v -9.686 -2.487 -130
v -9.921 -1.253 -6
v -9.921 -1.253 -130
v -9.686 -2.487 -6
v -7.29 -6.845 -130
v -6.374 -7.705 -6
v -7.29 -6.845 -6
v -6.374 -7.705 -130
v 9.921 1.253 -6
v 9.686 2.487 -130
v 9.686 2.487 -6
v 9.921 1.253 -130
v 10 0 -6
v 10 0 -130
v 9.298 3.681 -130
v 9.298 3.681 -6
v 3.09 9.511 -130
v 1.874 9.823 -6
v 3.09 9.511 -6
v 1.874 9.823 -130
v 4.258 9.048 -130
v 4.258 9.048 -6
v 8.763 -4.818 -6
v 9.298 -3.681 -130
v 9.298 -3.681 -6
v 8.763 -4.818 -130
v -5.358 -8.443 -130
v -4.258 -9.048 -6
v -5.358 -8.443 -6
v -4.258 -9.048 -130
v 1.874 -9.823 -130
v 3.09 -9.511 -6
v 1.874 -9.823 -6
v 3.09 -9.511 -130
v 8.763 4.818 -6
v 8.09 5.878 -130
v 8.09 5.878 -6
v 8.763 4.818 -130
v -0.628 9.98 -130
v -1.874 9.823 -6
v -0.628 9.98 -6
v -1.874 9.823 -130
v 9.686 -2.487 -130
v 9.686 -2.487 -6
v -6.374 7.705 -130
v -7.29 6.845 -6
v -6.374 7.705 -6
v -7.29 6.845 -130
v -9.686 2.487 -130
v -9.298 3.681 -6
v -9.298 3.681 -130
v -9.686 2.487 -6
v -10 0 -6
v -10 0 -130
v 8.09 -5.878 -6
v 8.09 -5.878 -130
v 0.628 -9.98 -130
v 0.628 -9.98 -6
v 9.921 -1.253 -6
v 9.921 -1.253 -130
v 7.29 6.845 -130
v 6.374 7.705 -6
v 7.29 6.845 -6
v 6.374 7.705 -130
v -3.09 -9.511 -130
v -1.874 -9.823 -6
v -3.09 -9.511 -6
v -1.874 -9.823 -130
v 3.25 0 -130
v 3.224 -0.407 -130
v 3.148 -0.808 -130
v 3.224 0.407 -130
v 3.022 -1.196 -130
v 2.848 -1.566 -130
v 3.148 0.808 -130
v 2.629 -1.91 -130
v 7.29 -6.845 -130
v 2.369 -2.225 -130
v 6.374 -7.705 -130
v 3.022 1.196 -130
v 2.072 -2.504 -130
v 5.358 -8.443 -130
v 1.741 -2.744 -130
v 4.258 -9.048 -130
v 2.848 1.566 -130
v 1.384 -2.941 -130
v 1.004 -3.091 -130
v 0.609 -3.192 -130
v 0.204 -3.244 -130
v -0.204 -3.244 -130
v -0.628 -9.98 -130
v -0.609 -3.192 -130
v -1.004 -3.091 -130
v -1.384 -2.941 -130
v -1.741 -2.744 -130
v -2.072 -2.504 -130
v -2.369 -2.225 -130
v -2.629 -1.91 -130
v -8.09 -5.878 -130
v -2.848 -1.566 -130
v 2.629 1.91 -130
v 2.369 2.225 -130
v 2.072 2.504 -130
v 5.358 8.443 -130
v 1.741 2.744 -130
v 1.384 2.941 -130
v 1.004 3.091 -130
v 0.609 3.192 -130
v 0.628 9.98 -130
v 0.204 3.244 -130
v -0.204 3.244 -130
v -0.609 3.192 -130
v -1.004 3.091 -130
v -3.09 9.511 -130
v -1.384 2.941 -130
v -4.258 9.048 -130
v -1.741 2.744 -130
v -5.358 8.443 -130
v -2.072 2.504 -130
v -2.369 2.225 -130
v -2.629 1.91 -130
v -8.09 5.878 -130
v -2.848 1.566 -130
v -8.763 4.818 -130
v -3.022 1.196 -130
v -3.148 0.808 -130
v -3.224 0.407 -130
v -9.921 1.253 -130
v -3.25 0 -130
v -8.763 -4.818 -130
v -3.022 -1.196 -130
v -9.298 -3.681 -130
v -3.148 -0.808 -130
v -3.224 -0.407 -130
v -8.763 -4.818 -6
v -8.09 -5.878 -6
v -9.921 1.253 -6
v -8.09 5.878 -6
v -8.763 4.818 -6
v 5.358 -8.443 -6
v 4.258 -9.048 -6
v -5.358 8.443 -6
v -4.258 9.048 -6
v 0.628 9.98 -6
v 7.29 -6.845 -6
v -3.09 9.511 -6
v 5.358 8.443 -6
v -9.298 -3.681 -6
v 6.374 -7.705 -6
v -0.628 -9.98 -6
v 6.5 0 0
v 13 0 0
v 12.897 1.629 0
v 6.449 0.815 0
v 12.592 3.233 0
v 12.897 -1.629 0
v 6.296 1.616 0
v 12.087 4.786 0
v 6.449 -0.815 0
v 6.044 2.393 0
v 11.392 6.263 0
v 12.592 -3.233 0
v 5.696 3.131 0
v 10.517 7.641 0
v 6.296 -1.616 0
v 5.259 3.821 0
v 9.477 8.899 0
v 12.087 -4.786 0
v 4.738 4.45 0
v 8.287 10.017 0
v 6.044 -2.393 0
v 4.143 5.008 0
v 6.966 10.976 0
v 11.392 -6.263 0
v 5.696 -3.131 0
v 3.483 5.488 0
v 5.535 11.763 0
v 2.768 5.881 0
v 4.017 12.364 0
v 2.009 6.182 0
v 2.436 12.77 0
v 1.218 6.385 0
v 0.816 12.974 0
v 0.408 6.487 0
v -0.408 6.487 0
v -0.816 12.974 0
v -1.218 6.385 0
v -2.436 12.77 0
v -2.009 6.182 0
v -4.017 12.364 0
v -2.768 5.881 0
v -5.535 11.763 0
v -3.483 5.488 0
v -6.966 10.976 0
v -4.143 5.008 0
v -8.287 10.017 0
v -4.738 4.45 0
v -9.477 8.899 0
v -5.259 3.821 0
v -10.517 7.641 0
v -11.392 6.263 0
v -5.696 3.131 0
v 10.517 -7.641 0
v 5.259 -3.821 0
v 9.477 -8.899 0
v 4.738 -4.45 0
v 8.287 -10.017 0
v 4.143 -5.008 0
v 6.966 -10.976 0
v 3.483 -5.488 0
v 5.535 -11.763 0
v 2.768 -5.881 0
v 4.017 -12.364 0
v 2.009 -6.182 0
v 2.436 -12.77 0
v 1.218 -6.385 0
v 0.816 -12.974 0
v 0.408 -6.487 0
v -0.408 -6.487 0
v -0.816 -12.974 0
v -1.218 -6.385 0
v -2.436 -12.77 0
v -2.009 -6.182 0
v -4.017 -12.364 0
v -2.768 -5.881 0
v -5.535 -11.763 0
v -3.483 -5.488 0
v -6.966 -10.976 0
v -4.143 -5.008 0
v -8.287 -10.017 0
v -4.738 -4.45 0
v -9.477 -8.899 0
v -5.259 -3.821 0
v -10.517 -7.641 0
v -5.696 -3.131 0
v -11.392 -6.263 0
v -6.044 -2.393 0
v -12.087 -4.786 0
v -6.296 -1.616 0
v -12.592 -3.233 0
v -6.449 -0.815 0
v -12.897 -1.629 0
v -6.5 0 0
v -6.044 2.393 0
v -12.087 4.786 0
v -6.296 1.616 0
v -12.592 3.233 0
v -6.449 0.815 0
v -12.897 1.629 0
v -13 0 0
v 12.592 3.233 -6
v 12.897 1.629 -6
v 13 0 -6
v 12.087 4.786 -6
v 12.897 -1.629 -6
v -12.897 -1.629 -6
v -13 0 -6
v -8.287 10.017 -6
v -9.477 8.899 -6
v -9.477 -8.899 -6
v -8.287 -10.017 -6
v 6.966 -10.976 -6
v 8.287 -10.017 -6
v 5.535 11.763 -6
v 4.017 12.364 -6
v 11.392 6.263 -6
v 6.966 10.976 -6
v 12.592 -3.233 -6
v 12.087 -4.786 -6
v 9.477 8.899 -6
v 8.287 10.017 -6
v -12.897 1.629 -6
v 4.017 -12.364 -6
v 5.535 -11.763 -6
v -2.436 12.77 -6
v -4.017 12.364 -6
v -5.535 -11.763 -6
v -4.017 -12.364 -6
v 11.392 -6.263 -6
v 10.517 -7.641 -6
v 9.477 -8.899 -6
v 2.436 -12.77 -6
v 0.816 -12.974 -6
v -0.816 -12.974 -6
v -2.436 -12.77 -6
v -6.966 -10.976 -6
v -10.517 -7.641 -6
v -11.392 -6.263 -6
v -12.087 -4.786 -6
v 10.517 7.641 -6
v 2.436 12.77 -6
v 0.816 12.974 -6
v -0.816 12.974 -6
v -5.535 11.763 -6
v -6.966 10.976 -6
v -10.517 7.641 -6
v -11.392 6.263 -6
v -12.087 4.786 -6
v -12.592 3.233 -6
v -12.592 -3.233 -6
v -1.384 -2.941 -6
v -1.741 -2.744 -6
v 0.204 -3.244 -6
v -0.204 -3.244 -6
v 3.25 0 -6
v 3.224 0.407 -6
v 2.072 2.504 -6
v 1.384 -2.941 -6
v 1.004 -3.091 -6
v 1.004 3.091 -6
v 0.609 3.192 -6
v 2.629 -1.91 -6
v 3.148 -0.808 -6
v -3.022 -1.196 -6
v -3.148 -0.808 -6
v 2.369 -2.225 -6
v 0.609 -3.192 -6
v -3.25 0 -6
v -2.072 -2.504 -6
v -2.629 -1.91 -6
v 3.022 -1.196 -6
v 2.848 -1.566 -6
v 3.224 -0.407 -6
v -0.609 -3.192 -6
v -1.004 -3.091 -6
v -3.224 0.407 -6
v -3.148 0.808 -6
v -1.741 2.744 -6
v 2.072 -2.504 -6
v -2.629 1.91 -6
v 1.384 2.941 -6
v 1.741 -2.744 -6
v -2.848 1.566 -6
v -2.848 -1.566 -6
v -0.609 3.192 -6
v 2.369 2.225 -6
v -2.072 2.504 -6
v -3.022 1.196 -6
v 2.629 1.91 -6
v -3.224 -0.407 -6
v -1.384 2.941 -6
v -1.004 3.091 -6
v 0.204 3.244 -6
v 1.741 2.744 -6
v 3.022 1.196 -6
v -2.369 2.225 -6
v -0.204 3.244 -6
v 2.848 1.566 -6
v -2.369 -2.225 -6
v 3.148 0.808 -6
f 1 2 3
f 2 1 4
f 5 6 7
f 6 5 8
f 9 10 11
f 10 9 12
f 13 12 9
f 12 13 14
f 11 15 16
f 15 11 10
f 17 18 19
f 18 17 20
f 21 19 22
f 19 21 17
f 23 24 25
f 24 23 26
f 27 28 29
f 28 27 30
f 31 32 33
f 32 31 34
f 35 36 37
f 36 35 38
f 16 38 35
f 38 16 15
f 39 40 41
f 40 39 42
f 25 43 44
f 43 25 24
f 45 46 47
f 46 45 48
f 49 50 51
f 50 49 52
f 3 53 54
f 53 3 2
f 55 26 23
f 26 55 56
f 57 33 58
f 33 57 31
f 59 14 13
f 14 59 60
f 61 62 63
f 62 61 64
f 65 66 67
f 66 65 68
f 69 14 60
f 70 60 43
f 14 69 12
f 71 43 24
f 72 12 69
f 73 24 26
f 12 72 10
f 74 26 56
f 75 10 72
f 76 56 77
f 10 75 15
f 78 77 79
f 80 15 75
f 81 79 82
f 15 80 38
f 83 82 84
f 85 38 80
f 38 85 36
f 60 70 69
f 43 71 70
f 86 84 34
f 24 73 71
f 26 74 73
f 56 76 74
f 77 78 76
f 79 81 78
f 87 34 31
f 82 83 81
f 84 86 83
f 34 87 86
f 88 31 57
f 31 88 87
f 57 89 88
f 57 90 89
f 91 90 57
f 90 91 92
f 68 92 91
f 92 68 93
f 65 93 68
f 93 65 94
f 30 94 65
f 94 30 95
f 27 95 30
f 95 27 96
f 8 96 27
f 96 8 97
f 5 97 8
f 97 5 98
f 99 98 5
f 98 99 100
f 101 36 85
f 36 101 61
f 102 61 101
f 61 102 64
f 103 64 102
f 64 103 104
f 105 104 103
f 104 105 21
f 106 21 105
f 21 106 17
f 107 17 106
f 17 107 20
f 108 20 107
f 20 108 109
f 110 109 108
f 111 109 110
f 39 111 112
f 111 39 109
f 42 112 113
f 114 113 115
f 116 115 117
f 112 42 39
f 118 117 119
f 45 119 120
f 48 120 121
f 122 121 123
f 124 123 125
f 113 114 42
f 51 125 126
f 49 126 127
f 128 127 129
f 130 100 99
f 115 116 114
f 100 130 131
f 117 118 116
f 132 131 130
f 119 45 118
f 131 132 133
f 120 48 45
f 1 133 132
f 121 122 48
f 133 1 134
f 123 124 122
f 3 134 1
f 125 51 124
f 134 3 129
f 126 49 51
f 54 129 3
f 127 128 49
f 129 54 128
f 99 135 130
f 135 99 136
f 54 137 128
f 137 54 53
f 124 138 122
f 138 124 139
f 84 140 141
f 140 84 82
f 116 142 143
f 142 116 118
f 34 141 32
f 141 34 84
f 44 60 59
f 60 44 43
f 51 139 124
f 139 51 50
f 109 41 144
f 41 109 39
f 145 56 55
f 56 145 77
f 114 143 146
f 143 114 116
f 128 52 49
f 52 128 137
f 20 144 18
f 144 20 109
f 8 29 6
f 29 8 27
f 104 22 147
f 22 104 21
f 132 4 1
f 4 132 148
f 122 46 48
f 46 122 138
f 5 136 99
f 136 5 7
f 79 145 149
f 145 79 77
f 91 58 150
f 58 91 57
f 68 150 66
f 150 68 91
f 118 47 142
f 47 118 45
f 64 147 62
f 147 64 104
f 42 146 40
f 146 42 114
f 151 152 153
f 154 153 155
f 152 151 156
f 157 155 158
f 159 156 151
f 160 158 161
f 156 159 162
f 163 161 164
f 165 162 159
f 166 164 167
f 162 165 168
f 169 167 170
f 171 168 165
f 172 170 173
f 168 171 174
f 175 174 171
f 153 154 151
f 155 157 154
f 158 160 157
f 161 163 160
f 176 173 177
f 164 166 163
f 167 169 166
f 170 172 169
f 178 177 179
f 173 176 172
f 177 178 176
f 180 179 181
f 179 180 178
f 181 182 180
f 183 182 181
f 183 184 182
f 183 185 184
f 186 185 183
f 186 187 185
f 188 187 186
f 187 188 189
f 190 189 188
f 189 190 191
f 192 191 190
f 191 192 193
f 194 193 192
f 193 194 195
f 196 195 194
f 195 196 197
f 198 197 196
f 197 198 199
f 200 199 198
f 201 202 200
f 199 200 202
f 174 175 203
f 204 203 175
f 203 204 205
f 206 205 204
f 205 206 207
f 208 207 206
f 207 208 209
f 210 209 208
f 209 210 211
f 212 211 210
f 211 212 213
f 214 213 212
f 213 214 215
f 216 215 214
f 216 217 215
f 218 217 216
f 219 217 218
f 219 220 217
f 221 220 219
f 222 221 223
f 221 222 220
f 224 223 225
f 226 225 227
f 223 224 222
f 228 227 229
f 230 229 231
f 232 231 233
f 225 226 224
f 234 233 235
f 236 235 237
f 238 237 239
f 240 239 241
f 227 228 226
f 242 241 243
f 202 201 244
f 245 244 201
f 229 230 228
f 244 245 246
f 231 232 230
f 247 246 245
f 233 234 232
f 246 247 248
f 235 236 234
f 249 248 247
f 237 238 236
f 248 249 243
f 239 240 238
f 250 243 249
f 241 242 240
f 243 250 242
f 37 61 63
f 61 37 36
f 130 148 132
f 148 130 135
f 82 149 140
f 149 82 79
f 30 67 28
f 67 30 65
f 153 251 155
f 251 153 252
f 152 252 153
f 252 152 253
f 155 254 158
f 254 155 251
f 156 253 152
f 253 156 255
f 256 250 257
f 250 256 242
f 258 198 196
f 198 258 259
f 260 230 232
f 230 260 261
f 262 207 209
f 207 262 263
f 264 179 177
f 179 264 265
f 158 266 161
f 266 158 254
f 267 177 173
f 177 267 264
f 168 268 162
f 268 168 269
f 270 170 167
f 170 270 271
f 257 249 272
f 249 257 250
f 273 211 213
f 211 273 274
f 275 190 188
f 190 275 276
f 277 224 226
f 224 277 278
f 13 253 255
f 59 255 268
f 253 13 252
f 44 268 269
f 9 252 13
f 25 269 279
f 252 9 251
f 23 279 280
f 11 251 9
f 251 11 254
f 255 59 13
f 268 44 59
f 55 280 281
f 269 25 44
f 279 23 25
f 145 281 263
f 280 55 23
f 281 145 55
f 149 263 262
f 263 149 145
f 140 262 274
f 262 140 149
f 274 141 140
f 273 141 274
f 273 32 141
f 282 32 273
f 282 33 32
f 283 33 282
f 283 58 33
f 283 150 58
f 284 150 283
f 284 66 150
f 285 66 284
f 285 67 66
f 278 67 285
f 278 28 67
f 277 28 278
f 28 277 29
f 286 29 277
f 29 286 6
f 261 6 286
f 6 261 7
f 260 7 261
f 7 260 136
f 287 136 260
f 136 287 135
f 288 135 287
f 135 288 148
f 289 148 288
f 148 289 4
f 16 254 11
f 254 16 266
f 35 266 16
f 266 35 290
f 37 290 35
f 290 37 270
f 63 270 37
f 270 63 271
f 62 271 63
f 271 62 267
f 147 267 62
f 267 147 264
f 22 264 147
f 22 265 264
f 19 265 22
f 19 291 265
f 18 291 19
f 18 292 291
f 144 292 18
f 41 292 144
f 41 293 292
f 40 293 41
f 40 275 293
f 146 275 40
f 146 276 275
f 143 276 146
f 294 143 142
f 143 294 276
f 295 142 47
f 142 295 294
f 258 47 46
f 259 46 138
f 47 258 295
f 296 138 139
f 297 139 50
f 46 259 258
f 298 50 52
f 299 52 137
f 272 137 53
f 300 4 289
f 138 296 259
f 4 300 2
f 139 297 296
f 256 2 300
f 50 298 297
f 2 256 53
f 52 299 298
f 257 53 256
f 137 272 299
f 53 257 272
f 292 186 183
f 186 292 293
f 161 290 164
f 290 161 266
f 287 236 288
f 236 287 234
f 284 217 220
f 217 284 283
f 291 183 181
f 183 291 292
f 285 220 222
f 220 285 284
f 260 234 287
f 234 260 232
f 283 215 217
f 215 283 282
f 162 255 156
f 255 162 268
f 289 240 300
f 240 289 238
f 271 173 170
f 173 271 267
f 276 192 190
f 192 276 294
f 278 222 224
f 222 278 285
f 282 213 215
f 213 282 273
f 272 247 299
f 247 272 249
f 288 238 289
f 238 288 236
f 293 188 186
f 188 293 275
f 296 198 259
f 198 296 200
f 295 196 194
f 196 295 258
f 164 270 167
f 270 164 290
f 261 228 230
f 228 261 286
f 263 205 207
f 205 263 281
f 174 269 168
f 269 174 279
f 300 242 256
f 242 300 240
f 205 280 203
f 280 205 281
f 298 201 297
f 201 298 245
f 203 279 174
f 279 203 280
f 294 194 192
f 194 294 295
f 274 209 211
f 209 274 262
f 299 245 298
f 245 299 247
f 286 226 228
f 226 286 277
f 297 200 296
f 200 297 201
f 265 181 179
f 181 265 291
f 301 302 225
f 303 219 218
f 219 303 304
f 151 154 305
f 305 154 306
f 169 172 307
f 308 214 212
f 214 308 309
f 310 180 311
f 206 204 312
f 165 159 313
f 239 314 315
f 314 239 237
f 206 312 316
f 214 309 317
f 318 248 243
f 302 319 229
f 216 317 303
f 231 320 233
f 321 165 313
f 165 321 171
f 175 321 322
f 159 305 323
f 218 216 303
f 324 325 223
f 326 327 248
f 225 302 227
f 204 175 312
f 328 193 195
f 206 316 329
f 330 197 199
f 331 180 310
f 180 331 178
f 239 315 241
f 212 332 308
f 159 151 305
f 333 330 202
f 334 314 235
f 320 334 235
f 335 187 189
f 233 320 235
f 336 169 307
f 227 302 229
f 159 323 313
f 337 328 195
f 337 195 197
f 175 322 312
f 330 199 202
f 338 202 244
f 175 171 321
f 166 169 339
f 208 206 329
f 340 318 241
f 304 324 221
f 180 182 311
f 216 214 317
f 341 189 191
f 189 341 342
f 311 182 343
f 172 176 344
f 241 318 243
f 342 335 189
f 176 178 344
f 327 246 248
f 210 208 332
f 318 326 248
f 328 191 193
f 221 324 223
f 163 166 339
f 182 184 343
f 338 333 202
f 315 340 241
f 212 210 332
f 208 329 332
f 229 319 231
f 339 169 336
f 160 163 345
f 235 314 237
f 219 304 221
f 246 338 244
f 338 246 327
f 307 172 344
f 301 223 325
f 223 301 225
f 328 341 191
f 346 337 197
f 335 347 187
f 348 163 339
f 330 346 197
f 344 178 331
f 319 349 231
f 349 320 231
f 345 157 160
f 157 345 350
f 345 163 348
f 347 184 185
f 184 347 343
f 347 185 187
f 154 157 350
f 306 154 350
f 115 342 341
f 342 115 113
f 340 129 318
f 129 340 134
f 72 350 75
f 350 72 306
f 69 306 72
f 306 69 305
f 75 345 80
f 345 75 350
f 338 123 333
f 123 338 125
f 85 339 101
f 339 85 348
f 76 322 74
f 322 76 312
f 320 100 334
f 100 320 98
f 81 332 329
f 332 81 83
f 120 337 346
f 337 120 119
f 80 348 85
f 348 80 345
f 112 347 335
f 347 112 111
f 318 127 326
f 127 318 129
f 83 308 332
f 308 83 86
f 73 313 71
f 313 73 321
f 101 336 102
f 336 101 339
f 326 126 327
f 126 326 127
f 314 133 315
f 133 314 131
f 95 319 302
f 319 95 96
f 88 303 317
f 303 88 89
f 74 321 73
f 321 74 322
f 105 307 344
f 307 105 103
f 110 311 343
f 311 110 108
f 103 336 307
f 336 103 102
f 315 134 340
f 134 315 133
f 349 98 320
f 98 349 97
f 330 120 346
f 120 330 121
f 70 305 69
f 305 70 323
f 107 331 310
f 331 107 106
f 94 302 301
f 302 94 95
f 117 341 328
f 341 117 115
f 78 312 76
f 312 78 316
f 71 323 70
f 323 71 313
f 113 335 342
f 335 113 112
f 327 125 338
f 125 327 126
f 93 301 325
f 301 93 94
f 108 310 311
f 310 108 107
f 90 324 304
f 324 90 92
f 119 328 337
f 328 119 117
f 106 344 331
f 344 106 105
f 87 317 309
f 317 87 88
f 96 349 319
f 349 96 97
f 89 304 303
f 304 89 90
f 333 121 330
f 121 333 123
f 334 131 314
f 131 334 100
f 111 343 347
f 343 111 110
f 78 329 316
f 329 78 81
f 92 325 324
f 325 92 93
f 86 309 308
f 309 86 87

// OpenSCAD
$fn = 50;


difference() {
	union() {
		translate(v = [0, 0, -130.0000000000]) {
			cylinder(h = 130, r = 10.0000000000);
		}
		translate(v = [0, 0, -6.0000000000]) {
			cylinder(h = 6, r = 13.0000000000);
		}
	}
	union() {
		translate(v = [0, 0, 0]) {
			rotate(a = [0, 0, 0]) {
				difference() {
					union() {
						#translate(v = [0, 0, -130.0000000000]) {
							cylinder(h = 130, r = 2.2500000000);
						}
						#translate(v = [0, 0, -6]) {
							cylinder(h = 6, r1 = 3.2500000000, r2 = 6.5000000000);
						}
						#translate(v = [0, 0, -130.0000000000]) {
							cylinder(h = 130, r = 3.2500000000);
						}
						#translate(v = [0, 0, -130.0000000000]) {
							cylinder(h = 130, r = 2.2500000000);
						}
					}
					union();
				}
			}
		}
	}
}
